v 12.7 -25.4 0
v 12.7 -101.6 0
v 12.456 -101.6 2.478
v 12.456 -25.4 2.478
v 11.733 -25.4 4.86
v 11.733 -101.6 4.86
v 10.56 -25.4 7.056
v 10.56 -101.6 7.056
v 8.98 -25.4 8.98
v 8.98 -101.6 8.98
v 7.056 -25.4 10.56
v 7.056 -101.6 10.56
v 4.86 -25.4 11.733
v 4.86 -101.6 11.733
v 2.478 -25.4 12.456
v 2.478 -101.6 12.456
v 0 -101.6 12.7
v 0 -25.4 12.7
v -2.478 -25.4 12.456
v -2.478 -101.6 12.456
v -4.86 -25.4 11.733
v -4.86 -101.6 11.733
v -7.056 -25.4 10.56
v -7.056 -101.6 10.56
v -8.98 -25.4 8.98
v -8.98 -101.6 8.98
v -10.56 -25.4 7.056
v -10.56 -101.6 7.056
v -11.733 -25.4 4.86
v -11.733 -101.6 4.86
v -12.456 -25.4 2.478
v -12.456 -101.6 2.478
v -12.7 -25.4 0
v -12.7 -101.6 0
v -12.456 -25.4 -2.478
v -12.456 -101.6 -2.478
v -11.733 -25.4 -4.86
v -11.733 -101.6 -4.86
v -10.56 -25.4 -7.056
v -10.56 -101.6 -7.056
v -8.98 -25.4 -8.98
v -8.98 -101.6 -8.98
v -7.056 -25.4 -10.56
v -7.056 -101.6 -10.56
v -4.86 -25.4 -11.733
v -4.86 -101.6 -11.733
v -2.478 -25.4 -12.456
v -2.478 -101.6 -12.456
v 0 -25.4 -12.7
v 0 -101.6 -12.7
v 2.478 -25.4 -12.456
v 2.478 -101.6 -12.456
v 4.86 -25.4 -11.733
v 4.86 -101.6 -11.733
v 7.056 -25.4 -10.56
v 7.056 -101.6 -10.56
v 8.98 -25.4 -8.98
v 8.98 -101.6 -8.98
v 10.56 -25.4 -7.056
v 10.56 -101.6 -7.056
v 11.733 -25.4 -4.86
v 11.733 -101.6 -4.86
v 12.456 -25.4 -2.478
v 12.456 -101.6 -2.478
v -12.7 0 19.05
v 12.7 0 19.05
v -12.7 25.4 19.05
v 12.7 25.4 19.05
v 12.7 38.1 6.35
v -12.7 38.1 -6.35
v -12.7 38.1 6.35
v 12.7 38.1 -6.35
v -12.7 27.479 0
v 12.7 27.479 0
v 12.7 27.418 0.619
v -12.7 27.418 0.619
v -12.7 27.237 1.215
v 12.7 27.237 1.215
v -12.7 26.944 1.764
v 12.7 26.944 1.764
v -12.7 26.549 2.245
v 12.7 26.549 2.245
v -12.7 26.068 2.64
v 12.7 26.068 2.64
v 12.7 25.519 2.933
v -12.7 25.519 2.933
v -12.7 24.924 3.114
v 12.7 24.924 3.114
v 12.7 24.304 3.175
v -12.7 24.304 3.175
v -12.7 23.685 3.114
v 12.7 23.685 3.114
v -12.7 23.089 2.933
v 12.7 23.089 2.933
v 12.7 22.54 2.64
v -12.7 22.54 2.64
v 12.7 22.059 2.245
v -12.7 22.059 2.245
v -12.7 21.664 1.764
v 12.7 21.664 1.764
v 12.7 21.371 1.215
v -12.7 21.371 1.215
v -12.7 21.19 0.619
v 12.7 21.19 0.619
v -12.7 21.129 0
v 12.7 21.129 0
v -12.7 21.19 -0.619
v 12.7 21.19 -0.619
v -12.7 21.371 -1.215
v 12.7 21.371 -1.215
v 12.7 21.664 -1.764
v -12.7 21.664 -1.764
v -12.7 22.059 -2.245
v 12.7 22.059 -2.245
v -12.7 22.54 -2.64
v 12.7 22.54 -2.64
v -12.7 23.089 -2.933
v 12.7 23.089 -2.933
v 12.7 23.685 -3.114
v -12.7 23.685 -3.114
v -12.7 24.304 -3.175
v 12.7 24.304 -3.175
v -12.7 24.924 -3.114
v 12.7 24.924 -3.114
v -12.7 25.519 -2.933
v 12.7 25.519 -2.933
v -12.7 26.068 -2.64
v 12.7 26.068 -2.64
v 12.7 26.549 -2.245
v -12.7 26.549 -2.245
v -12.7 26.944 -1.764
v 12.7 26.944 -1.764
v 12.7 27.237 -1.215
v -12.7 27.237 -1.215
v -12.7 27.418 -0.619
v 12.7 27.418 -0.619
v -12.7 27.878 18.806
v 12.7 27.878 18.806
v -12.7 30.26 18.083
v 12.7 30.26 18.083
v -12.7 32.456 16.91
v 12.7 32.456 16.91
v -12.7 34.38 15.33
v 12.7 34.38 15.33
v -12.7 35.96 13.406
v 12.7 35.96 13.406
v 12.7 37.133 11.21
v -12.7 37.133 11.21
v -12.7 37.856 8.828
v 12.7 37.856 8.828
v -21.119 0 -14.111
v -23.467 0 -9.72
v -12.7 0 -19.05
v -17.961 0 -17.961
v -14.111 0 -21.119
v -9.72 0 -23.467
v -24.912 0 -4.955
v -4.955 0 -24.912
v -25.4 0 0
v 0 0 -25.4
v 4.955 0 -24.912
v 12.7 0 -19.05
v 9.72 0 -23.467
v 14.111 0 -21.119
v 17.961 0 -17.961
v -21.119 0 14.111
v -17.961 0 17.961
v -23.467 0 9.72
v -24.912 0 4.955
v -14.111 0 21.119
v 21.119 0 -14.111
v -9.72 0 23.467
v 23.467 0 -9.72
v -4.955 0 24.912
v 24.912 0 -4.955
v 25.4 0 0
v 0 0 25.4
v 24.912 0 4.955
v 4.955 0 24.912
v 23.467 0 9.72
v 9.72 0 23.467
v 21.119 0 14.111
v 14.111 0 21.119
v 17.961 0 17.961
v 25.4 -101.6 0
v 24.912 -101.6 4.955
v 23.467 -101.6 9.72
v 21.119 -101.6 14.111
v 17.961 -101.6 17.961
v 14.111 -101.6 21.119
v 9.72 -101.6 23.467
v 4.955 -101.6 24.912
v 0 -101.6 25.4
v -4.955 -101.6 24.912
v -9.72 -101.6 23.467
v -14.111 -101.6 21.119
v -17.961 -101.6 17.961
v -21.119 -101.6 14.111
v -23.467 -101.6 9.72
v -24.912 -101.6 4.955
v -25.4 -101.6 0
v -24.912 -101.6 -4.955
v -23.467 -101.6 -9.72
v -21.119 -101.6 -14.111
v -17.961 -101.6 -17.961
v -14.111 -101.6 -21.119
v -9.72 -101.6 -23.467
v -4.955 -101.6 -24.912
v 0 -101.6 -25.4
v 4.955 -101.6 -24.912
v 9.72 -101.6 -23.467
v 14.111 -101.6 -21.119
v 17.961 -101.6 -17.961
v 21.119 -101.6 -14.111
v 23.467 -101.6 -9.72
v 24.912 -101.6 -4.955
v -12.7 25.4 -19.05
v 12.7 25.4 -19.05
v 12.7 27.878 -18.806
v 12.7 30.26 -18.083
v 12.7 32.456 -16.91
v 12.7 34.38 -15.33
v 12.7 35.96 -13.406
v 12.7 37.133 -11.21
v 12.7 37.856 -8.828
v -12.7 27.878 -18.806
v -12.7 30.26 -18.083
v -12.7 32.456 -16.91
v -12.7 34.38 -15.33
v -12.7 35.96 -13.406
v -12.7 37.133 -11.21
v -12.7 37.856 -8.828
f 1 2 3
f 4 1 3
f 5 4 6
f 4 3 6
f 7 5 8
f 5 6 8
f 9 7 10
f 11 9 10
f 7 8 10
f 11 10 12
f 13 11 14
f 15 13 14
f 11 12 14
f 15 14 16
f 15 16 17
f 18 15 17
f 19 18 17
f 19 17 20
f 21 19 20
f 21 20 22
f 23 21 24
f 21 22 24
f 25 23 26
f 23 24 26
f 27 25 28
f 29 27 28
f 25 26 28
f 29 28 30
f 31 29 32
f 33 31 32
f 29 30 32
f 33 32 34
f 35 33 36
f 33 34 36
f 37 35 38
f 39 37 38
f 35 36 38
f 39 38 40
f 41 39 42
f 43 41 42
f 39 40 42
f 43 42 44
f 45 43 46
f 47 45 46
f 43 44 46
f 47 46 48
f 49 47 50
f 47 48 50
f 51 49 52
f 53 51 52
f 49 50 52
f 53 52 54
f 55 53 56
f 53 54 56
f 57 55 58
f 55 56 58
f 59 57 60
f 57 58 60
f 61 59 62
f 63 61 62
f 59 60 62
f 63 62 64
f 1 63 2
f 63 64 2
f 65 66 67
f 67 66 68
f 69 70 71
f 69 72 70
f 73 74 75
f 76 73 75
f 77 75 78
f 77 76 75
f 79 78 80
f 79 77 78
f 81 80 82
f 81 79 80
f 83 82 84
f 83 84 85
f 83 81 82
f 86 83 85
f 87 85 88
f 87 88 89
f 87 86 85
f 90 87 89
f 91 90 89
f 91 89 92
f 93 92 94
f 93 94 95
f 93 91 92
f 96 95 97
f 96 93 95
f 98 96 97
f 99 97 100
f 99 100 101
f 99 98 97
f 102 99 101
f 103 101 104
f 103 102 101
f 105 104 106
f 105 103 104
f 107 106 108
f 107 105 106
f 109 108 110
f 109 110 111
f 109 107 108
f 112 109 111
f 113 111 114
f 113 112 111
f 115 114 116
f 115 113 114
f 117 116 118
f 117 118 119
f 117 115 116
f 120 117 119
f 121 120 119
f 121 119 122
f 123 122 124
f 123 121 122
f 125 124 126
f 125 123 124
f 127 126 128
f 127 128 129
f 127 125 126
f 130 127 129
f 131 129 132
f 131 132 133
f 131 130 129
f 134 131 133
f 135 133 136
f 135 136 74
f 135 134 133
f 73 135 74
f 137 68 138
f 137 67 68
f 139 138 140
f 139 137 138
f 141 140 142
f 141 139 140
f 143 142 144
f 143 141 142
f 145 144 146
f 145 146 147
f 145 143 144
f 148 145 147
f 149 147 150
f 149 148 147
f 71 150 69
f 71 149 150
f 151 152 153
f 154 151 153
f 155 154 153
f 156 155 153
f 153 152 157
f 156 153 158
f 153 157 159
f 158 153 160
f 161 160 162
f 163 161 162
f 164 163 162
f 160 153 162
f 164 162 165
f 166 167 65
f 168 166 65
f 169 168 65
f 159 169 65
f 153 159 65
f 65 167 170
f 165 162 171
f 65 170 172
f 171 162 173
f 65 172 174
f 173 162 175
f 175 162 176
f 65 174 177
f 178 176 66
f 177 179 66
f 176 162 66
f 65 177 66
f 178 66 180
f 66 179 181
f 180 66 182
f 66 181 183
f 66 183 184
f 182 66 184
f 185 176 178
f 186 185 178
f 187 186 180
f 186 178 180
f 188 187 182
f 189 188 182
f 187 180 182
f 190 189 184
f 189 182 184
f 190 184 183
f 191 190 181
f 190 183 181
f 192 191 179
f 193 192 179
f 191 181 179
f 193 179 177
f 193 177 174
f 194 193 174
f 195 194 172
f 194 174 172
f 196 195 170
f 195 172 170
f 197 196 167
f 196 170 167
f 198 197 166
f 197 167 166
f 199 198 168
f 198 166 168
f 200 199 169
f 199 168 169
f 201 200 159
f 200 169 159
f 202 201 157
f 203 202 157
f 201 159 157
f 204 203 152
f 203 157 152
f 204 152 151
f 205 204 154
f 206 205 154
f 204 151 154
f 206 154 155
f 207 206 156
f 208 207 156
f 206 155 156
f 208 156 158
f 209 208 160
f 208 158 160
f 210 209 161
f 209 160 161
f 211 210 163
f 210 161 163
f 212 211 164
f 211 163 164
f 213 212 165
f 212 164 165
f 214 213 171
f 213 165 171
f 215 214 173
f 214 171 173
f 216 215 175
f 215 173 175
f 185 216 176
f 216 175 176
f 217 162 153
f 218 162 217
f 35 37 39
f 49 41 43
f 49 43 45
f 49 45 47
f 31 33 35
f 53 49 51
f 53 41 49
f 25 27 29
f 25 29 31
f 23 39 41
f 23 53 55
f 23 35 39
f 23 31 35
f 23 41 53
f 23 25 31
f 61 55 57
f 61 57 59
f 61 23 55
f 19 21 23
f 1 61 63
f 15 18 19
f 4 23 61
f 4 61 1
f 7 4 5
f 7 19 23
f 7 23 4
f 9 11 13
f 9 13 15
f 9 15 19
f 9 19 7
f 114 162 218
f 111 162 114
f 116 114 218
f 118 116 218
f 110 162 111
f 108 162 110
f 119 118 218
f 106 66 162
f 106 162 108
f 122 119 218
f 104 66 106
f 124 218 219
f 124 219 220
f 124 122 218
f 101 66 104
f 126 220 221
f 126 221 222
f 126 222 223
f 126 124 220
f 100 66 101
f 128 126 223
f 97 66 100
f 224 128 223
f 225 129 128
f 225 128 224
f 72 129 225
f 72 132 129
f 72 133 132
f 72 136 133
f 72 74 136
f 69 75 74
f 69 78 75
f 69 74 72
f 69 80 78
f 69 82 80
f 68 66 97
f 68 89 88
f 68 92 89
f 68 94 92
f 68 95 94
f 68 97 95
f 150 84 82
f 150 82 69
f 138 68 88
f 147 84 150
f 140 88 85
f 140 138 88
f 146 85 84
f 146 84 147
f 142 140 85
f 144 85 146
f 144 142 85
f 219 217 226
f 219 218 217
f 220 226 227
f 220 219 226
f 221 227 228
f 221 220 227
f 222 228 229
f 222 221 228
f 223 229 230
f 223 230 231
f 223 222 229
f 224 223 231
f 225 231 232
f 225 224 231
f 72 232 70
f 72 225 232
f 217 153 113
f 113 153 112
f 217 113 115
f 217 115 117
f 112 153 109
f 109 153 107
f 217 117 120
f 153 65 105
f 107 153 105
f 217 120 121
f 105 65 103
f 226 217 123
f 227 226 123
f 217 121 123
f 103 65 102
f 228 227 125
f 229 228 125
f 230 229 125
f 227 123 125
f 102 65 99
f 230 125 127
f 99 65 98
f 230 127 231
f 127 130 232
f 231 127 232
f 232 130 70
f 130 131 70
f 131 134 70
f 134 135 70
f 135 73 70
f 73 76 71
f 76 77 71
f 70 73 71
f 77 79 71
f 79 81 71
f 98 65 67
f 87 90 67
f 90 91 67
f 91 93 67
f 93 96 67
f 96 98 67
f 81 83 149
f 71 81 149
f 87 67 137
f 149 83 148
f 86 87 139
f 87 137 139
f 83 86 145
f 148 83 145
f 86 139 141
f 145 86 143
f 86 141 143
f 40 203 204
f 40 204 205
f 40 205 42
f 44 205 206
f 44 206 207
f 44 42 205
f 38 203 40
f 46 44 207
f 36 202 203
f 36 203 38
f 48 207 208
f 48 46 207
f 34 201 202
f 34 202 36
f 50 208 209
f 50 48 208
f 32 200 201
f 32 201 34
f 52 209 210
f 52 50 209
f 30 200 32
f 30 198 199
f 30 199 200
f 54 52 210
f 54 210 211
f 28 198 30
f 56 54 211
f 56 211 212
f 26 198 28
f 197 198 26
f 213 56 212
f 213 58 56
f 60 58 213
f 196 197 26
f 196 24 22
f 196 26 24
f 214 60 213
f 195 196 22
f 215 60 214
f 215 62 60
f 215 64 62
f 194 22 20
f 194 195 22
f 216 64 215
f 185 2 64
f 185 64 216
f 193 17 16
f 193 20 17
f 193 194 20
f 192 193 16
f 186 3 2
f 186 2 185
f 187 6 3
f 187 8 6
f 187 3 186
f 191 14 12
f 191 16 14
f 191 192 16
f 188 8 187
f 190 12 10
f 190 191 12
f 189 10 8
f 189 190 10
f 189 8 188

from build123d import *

# Parameters (mm, degrees)
F0_R     = 25.4
F1_DEPTH = 101.6
F2_R     = 12.7
F3_DEPTH = 76.2
F4_W     = 38.1
F4_H     = 38.1
F4_R     = 3.175
F5_DEPTH = 12.7
F6_R     = 12.7


with BuildPart() as f1:
    # F0 (on Front) → F1 (new body)
    with BuildSketch(Plane.XZ):
        Circle(F0_R)
    extrude(amount=F1_DEPTH)

    # F2 (on face) → F3 (cut)
    with BuildSketch(Plane.XZ.offset(101.6)):
        Circle(F2_R)
    extrude(amount=-F3_DEPTH, mode=Mode.SUBTRACT)

    # F4 (on Right) → F5 (join, symmetric)
    with BuildSketch(Plane.YZ):
        with Locations((19.05, 0)):
            Rectangle(F4_W, F4_H)
        with Locations((24.3041142821, 0)):
            Circle(F4_R, mode=Mode.SUBTRACT)
    extrude(amount=F5_DEPTH, both=True)

    # F6
    f6_edges = [f1.edges().sort_by_distance(p)[0] for p in [
        (0, 38.1, 19.05),
        (0, 38.1, -19.05),
    ]]
    fillet(f6_edges, radius=F6_R)


solid = f1.part
